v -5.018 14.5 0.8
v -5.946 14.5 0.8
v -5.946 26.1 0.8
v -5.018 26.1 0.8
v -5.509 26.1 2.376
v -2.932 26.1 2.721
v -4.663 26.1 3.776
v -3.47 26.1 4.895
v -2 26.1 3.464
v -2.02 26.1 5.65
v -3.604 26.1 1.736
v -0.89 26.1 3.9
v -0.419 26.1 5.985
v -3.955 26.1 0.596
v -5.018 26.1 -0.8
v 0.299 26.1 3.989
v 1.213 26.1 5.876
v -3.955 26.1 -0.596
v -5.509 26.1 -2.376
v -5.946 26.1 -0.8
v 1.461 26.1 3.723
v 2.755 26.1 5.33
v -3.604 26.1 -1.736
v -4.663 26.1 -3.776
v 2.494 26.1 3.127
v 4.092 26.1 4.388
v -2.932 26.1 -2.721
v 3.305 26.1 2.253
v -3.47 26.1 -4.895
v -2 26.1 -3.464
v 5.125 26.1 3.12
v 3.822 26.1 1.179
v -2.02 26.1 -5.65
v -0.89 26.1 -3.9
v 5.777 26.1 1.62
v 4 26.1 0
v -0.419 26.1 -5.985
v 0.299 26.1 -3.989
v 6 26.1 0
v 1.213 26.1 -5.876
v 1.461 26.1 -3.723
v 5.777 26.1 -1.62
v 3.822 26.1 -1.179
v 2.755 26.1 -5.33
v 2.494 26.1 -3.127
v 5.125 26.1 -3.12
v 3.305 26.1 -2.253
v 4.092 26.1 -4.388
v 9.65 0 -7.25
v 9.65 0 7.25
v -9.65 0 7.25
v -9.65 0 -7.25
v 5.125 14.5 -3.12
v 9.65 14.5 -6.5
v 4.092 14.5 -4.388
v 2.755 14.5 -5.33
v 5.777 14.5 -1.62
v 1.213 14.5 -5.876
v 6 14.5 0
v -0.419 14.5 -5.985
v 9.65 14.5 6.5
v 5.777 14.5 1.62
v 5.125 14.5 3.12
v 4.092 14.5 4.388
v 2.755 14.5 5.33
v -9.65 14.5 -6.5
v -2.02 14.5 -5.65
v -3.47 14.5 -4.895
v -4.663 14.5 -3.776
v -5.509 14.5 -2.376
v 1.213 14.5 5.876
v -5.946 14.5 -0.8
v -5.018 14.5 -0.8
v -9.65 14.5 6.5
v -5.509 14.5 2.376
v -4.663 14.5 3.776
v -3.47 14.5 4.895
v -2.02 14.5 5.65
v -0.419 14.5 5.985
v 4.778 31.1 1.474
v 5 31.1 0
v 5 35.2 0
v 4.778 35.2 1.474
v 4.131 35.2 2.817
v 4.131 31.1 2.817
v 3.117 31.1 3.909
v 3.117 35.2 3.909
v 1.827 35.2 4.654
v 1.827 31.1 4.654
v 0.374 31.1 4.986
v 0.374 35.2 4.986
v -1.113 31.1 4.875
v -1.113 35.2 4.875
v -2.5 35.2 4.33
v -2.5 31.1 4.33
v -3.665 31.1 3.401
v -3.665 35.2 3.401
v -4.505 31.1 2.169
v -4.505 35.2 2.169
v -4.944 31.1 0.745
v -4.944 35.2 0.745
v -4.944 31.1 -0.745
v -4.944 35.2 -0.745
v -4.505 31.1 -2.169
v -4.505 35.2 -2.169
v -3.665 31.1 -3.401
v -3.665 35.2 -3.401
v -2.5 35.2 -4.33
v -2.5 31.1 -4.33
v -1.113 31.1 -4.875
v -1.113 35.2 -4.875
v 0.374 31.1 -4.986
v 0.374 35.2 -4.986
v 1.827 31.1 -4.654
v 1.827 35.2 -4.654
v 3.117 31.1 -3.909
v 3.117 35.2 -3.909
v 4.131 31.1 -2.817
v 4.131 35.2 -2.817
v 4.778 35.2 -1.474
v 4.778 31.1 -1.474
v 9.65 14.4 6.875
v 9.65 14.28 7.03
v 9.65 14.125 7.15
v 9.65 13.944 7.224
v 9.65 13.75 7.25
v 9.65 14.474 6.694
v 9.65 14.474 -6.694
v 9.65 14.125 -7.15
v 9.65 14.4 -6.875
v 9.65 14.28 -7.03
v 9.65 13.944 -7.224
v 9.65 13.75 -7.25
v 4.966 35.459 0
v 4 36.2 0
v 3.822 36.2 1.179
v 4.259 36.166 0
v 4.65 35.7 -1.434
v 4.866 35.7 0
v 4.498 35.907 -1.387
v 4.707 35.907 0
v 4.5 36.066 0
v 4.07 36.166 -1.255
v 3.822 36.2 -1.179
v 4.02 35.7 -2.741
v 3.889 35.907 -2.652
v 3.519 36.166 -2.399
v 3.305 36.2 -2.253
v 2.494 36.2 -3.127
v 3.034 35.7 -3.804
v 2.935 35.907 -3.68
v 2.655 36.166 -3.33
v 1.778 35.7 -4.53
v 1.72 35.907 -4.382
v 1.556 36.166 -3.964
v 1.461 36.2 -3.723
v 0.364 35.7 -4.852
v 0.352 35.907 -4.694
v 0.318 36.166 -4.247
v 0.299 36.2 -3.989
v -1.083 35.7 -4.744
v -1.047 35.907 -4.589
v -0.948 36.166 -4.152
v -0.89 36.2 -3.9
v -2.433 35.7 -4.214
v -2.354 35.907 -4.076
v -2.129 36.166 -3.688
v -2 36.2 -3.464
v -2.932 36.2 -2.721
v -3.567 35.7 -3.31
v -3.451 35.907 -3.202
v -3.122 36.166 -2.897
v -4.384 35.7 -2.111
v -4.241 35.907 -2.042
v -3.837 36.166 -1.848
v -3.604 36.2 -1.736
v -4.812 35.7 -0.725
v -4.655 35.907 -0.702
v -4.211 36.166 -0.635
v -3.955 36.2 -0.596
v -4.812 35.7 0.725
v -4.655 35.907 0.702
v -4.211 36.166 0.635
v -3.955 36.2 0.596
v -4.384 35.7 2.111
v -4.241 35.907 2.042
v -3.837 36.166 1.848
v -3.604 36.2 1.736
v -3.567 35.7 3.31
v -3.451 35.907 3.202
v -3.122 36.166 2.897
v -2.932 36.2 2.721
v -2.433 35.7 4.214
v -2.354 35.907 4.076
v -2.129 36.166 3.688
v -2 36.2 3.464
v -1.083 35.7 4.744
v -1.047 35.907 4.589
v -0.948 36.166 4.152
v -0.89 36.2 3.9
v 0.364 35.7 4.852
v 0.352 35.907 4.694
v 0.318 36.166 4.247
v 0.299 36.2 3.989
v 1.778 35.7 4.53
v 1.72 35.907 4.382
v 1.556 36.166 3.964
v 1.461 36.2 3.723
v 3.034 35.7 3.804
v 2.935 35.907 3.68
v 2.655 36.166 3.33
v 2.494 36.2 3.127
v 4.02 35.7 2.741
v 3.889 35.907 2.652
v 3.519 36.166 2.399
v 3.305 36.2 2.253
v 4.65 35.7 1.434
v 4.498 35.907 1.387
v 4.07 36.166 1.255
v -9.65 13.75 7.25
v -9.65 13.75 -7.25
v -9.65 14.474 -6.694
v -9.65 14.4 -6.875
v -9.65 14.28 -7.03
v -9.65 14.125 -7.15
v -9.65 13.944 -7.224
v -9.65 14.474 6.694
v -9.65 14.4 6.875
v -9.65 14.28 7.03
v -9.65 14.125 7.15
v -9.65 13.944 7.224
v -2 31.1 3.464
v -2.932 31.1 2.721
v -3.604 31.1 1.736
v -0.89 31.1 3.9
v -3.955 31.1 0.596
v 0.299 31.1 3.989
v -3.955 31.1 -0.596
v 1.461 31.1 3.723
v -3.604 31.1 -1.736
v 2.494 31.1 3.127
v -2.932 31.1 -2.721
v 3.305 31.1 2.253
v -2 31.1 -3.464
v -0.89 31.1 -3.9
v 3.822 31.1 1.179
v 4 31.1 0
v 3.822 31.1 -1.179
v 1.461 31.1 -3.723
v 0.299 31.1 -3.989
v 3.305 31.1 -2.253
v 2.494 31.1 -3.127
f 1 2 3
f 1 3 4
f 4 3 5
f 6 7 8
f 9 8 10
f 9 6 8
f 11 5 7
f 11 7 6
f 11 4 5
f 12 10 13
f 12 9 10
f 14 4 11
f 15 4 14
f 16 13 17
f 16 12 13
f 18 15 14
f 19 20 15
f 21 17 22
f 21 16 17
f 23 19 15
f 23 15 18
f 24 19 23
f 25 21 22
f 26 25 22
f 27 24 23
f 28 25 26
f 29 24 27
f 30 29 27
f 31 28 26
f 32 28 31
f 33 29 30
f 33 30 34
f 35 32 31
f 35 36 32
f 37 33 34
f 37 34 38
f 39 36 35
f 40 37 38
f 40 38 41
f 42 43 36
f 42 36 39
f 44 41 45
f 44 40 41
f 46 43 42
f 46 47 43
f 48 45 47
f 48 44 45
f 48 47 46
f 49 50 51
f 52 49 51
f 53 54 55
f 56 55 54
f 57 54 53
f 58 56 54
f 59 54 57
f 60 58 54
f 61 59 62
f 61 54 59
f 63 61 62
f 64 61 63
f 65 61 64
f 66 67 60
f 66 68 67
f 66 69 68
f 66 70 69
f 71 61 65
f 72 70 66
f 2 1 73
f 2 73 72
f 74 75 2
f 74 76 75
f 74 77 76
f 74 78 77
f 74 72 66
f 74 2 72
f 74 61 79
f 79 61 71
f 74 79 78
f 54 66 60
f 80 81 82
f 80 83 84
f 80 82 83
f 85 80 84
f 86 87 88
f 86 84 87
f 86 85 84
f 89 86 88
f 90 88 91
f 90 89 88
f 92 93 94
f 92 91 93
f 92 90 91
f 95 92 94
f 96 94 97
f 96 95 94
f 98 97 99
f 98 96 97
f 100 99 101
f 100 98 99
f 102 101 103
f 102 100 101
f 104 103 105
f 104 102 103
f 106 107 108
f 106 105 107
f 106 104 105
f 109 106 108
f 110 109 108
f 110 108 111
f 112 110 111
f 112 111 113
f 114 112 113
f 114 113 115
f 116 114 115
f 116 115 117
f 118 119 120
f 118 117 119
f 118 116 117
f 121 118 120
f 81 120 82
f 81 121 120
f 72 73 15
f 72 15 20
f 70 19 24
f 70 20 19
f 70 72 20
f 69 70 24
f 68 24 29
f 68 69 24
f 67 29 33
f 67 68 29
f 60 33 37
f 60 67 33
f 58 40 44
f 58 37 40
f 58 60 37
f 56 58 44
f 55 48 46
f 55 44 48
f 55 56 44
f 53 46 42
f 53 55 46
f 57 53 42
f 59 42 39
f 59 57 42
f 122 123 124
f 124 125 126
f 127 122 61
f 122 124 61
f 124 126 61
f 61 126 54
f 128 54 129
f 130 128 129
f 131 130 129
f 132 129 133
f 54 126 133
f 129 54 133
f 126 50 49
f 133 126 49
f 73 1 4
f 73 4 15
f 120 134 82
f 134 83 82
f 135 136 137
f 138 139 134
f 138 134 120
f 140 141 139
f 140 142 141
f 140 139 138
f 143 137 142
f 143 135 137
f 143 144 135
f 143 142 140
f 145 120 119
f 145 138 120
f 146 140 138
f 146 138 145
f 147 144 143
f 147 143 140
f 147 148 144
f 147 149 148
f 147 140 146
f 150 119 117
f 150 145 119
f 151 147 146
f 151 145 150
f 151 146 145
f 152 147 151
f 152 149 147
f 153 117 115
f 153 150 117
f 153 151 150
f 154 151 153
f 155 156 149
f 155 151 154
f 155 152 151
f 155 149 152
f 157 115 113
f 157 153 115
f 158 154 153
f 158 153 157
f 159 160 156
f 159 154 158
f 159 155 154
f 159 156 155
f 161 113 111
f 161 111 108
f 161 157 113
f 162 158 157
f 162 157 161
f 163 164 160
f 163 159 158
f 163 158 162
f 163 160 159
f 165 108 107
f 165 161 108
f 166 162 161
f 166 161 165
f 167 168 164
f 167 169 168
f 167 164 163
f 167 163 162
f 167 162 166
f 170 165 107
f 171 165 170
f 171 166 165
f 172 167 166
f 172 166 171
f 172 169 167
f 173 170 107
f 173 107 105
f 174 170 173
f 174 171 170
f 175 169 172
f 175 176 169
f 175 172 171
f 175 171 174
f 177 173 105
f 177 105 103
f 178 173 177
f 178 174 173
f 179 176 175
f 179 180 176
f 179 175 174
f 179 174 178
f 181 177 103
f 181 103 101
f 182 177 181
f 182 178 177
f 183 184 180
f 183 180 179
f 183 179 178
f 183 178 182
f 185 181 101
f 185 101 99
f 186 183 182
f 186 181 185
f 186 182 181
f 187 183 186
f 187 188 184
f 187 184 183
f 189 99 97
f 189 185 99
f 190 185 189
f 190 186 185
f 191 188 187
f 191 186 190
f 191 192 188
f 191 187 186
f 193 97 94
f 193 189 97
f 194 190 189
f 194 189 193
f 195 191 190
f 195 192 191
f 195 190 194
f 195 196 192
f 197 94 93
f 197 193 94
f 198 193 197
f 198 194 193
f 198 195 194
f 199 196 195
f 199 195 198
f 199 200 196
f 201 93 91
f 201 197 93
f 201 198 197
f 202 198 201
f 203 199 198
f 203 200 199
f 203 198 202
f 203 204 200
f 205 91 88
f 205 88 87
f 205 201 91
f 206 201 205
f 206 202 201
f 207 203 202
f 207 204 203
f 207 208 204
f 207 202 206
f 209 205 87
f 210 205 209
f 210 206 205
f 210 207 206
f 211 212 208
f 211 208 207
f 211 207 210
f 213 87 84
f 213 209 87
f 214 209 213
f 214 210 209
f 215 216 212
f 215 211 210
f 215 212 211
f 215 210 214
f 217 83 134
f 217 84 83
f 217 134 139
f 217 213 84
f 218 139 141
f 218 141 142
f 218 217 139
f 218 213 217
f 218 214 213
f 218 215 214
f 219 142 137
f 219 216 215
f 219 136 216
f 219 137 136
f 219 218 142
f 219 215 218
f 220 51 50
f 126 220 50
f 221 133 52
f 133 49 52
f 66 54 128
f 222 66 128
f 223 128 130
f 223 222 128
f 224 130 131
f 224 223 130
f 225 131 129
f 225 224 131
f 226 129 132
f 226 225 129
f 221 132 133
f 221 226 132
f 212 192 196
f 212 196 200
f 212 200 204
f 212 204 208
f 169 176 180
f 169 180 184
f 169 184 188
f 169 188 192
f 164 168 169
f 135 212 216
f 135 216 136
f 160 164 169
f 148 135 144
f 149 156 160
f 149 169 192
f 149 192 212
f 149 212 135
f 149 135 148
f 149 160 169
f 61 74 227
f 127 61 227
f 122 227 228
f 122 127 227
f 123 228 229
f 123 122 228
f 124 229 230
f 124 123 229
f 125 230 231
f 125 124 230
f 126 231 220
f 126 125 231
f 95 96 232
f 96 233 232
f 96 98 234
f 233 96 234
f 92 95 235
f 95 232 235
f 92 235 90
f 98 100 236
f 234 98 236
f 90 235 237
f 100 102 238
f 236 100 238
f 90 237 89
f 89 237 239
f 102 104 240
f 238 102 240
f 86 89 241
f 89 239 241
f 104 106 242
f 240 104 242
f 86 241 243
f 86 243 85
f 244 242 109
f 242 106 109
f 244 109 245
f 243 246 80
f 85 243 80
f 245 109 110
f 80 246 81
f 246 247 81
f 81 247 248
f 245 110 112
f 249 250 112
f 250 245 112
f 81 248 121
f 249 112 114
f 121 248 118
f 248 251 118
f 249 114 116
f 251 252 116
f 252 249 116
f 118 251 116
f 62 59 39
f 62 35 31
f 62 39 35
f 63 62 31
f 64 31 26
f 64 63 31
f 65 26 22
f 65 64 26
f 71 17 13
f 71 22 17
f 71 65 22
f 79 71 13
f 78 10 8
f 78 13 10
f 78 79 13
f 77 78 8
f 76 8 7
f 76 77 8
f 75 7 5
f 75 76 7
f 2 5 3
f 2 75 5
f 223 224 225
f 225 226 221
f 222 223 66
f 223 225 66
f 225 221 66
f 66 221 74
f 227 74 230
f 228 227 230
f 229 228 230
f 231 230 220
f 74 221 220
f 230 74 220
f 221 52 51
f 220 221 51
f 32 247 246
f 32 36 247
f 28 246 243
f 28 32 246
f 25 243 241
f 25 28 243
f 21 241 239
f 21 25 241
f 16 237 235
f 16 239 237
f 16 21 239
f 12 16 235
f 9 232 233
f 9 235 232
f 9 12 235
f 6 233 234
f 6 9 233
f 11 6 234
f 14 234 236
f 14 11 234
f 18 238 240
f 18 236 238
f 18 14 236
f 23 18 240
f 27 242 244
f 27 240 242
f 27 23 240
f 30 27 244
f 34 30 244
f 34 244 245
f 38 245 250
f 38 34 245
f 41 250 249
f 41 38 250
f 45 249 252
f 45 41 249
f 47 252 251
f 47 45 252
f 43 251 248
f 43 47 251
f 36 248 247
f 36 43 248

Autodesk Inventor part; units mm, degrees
ref_plane "YZ Plane" through (0, 0, 0) normal (1, 0, 0) x (0, 1, 0)
ref_plane "XZ Plane" through (0, 0, 0) normal (0, 1, 0) x (-1, 0, 0)
ref_plane "XY Plane" through (0, 0, 0) normal (0, 0, 1) x (1, 0, 0)
sketch "Sketch1" plane through (0, 0, 0) normal (0, 1, 0) x (-1, 0, 0)
  line L0 (9.65, 7.25) -> (-9.65, 7.25)
  line L1 (-9.65, 7.25) -> (-9.65, -7.25)
  line L2 (-9.65, -7.25) -> (9.65, -7.25)
  line L3 (9.65, -7.25) -> (9.65, 7.25)
  line L4 (9.65, 7.25) -> (-9.65, -7.25) construction
  line L5 (-9.65, 7.25) -> (9.65, -7.25) construction
  point P0 (0, 0)
  dimension "d0" = 19.3
  dimension "d1" = 14.5
extrude "Extrusion1" add sketch "Sketch1" along normal blind 14.5
sketch "Sketch2" plane through (0, 14.5, 0) normal (0, 1, 0) x (1, 0, 0)
  circle A0 centre (0, 0) radius 6
  line L0 (-6.9823, -0.8) -> (-5.0177, -0.8)
  line L1 (-5.0177, -0.8) -> (-5.0177, 0.8)
  line L2 (-5.0177, 0.8) -> (-6.9823, 0.8)
  line L3 (-6.9823, 0.8) -> (-6.9823, -0.8)
  line L4 (-6.9823, -0.8) -> (-5.0177, 0.8) construction
  line L5 (-5.0177, -0.8) -> (-6.9823, 0.8) construction
  point P0 (-6, 0)
  point P1 (5.9823, -0.4609)
  point P2 (-5.9464, -0.8)
  point P3 (-5.9464, 0.8)
  dimension "d4" = 12
  dimension "d5" = 1.6
  dimension "d6" = 11
extrude "Extrusion2" add sketch "Sketch2" along normal blind 11.6 contours A0 L0 L1 L2 picked at (-1.3451, 0)
sketch "Sketch3" plane through (0, 26.1, 0) normal (0, 1, 0) x (1, 0, 0)
  circle A0 centre (0, 0) radius 4
  dimension "d9" = 8
extrude "Extrusion3" add sketch "Sketch3" along normal blind 5
sketch "Sketch4" plane through (0, 31.1, 0) normal (0, 1, 0) x (1, 0, 0)
  circle A0 centre (0, 0) radius 5
  dimension "d12" = 10
extrude "Extrusion4" add sketch "Sketch4" along normal blind 5.1
fillet "Fillet1" radius 1 1 edges at (-5, 36.2, 0)
thread "Thread1" size "M12x0.75" class "6g" standard "ANSI Metric M Profile" full length
fillet "Fillet2" radius 0.75 2 edges at (0, 14.5, 7.25) (0, 14.5, -7.25)
properties part number "ar70736"
